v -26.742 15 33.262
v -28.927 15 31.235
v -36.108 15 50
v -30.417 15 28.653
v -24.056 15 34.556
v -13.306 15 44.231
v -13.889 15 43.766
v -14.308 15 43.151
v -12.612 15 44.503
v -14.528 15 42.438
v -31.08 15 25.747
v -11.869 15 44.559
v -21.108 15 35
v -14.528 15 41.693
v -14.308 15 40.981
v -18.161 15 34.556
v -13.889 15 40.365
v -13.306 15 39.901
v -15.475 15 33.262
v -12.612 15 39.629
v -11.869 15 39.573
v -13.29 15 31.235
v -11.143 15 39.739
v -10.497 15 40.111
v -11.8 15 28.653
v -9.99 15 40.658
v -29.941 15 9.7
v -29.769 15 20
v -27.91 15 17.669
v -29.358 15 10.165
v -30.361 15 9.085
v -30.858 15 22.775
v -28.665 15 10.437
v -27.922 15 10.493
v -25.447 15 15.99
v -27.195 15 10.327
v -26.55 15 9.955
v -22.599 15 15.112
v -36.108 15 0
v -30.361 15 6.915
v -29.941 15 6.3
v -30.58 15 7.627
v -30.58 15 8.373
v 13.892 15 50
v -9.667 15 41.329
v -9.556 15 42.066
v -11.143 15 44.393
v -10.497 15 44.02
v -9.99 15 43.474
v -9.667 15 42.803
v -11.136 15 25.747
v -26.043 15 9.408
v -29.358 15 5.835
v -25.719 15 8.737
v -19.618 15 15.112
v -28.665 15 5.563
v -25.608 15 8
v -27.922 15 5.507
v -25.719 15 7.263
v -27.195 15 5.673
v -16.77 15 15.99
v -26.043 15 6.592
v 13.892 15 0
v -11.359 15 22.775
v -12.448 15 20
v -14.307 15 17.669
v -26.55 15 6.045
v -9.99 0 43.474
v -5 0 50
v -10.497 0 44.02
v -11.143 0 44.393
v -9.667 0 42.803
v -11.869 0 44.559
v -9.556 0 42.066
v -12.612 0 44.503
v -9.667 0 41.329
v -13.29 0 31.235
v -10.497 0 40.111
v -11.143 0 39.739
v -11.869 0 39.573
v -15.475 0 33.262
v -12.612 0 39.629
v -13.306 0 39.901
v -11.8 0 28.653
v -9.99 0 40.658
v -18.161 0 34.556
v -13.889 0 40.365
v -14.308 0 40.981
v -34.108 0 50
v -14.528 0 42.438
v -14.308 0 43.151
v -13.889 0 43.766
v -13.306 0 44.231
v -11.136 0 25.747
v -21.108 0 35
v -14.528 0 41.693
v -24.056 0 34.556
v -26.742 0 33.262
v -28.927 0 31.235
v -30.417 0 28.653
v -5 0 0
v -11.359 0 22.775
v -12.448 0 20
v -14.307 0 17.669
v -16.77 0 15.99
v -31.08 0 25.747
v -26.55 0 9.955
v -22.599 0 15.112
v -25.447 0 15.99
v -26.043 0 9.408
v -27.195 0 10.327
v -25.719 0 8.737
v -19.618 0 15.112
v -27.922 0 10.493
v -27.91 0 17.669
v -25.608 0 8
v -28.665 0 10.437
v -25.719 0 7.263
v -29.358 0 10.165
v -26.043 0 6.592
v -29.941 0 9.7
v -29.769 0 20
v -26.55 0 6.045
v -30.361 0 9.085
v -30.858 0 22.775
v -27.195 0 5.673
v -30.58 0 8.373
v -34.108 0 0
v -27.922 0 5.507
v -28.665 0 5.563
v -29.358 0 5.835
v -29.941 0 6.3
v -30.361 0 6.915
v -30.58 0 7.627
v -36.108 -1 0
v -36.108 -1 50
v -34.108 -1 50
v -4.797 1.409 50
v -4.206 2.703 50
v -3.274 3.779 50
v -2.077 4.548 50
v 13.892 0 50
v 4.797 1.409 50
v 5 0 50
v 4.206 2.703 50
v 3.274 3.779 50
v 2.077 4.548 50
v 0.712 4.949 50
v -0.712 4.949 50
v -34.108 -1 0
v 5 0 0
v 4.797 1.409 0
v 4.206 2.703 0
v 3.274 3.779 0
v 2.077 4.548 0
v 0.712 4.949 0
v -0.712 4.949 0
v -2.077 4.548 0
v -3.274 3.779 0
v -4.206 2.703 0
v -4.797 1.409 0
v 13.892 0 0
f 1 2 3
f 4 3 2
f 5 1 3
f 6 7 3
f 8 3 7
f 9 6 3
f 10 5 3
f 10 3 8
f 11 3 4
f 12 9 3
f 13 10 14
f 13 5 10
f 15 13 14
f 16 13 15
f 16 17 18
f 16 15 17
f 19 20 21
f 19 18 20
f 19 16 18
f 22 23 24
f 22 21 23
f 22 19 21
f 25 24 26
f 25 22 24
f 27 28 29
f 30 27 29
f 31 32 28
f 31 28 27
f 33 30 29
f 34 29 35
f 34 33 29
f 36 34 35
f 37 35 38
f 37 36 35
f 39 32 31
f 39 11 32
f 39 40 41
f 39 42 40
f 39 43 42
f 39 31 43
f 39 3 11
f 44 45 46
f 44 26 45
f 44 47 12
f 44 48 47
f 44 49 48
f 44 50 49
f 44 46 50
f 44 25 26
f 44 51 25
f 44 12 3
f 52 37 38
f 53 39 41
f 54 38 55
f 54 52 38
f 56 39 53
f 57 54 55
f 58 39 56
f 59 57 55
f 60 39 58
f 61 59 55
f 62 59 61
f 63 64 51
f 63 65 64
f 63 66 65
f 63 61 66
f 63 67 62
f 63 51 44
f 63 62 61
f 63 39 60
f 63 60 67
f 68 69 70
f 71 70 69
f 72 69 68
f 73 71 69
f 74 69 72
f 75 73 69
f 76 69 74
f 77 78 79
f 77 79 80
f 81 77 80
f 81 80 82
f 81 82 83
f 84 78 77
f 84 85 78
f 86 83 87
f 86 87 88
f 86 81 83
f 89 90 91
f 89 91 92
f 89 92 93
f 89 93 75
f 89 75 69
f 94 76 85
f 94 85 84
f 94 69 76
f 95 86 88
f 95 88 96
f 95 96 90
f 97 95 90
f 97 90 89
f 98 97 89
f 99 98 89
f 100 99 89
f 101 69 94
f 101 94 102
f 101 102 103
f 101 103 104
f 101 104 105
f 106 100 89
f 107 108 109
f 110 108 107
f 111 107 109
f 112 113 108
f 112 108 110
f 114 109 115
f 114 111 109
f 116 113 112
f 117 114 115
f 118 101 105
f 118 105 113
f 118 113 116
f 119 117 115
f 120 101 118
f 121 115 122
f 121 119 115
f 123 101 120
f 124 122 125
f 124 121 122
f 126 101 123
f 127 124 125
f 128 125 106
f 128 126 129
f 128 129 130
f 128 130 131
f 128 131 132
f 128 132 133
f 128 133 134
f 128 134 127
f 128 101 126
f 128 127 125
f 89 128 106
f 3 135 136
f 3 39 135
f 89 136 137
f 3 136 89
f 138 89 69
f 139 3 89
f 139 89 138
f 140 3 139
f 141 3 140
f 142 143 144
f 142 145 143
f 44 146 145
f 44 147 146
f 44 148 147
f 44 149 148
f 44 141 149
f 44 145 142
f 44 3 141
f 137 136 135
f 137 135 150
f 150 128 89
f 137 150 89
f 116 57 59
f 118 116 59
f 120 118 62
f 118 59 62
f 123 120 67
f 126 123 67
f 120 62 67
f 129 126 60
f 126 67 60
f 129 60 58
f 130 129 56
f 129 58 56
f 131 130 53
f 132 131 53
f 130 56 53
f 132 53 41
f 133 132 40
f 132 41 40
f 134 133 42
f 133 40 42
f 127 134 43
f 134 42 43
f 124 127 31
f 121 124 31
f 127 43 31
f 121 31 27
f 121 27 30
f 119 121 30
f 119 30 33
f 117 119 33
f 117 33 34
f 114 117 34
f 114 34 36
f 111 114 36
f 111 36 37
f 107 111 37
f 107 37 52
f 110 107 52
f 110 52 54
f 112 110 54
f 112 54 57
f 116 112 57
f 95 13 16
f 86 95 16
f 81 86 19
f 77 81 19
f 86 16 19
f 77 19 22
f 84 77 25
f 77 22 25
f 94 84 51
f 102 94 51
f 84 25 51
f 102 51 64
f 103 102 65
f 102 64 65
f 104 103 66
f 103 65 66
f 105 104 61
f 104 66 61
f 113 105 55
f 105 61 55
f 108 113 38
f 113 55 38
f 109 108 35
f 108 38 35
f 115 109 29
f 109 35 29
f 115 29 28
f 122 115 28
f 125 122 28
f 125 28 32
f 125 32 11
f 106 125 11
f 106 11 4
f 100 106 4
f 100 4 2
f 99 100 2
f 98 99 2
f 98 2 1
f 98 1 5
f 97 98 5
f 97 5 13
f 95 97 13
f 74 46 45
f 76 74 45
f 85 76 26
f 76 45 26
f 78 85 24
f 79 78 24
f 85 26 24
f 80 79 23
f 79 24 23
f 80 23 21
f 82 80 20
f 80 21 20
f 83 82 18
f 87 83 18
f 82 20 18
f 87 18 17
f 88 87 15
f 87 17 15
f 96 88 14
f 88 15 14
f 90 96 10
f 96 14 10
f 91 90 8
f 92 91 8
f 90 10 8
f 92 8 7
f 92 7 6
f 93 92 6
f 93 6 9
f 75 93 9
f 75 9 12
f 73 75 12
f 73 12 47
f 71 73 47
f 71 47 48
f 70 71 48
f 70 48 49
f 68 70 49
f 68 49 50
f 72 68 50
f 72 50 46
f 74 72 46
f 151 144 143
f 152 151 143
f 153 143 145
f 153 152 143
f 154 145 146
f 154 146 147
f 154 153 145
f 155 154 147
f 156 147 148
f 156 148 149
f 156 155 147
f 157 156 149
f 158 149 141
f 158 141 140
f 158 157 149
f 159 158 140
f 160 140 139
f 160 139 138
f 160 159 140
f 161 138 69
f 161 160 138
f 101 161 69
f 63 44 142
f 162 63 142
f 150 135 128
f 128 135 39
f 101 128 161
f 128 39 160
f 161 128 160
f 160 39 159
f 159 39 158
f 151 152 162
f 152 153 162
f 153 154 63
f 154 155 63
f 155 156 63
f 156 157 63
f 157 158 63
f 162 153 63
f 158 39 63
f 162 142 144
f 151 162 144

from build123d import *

# Parameters (mm, degrees)
BOSS_EXTRU_1_DEPTH      = 50
TROU_TARAUD_M61_D       = 5
ESQUISSE4_W             = 2
ESQUISSE4_H             = 50
BOSS_EXTRU_2_DEPTH      = 1
ESQUISSE5_R             = 10
ENL_V_MAT_EXTRU_1_DEPTH = 64.716654463


with BuildPart() as part:
    # Esquisse1 → Boss.-Extru.1 (new body)
    with BuildSketch(Plane.XY):
        with BuildLine():
            Line((-36.108337762, 0), (-36.108337762, 15))
            Line((-36.108337762, 15), (13.891662238, 15))
            Line((13.891662238, 15), (13.891662238, 0))
            Line((13.891662238, 0), (5, 0))
            ThreePointArc((5, 0), (0, 5), (-5, 0))
            Line((-5, 0), (-36.108337762, 0))
        make_face()
    extrude(amount=BOSS_EXTRU_1_DEPTH)

    # Trou taraudé M61 (through all)
    with Locations(Plane(origin=(0, 0, 0), x_dir=(-1, 0, 0), z_dir=(0, -1, 0))):
        with Locations((12.056043545, -42.065822787), (28.108337762, -8)):
            Hole(TROU_TARAUD_M61_D / 2)

    # Esquisse4 → Boss.-Extru.2 (add)
    with BuildSketch(Plane.XZ):
        with Locations((-35.108337762, 25)):
            Rectangle(ESQUISSE4_W, ESQUISSE4_H)
    extrude(amount=BOSS_EXTRU_2_DEPTH)

    # Esquisse5 → Enlèv. mat.-Extru.1 (cut, through all)
    with BuildSketch(Plane(origin=(0, 15, 0), x_dir=(1, 0, 0), z_dir=(0, 1, 0))):
        with Locations(Location((-21.108337762, -25, 0), (0, 0, 270))):
            Circle(ESQUISSE5_R)
    extrude(amount=-ENL_V_MAT_EXTRU_1_DEPTH, mode=Mode.SUBTRACT)


solid = part.part
